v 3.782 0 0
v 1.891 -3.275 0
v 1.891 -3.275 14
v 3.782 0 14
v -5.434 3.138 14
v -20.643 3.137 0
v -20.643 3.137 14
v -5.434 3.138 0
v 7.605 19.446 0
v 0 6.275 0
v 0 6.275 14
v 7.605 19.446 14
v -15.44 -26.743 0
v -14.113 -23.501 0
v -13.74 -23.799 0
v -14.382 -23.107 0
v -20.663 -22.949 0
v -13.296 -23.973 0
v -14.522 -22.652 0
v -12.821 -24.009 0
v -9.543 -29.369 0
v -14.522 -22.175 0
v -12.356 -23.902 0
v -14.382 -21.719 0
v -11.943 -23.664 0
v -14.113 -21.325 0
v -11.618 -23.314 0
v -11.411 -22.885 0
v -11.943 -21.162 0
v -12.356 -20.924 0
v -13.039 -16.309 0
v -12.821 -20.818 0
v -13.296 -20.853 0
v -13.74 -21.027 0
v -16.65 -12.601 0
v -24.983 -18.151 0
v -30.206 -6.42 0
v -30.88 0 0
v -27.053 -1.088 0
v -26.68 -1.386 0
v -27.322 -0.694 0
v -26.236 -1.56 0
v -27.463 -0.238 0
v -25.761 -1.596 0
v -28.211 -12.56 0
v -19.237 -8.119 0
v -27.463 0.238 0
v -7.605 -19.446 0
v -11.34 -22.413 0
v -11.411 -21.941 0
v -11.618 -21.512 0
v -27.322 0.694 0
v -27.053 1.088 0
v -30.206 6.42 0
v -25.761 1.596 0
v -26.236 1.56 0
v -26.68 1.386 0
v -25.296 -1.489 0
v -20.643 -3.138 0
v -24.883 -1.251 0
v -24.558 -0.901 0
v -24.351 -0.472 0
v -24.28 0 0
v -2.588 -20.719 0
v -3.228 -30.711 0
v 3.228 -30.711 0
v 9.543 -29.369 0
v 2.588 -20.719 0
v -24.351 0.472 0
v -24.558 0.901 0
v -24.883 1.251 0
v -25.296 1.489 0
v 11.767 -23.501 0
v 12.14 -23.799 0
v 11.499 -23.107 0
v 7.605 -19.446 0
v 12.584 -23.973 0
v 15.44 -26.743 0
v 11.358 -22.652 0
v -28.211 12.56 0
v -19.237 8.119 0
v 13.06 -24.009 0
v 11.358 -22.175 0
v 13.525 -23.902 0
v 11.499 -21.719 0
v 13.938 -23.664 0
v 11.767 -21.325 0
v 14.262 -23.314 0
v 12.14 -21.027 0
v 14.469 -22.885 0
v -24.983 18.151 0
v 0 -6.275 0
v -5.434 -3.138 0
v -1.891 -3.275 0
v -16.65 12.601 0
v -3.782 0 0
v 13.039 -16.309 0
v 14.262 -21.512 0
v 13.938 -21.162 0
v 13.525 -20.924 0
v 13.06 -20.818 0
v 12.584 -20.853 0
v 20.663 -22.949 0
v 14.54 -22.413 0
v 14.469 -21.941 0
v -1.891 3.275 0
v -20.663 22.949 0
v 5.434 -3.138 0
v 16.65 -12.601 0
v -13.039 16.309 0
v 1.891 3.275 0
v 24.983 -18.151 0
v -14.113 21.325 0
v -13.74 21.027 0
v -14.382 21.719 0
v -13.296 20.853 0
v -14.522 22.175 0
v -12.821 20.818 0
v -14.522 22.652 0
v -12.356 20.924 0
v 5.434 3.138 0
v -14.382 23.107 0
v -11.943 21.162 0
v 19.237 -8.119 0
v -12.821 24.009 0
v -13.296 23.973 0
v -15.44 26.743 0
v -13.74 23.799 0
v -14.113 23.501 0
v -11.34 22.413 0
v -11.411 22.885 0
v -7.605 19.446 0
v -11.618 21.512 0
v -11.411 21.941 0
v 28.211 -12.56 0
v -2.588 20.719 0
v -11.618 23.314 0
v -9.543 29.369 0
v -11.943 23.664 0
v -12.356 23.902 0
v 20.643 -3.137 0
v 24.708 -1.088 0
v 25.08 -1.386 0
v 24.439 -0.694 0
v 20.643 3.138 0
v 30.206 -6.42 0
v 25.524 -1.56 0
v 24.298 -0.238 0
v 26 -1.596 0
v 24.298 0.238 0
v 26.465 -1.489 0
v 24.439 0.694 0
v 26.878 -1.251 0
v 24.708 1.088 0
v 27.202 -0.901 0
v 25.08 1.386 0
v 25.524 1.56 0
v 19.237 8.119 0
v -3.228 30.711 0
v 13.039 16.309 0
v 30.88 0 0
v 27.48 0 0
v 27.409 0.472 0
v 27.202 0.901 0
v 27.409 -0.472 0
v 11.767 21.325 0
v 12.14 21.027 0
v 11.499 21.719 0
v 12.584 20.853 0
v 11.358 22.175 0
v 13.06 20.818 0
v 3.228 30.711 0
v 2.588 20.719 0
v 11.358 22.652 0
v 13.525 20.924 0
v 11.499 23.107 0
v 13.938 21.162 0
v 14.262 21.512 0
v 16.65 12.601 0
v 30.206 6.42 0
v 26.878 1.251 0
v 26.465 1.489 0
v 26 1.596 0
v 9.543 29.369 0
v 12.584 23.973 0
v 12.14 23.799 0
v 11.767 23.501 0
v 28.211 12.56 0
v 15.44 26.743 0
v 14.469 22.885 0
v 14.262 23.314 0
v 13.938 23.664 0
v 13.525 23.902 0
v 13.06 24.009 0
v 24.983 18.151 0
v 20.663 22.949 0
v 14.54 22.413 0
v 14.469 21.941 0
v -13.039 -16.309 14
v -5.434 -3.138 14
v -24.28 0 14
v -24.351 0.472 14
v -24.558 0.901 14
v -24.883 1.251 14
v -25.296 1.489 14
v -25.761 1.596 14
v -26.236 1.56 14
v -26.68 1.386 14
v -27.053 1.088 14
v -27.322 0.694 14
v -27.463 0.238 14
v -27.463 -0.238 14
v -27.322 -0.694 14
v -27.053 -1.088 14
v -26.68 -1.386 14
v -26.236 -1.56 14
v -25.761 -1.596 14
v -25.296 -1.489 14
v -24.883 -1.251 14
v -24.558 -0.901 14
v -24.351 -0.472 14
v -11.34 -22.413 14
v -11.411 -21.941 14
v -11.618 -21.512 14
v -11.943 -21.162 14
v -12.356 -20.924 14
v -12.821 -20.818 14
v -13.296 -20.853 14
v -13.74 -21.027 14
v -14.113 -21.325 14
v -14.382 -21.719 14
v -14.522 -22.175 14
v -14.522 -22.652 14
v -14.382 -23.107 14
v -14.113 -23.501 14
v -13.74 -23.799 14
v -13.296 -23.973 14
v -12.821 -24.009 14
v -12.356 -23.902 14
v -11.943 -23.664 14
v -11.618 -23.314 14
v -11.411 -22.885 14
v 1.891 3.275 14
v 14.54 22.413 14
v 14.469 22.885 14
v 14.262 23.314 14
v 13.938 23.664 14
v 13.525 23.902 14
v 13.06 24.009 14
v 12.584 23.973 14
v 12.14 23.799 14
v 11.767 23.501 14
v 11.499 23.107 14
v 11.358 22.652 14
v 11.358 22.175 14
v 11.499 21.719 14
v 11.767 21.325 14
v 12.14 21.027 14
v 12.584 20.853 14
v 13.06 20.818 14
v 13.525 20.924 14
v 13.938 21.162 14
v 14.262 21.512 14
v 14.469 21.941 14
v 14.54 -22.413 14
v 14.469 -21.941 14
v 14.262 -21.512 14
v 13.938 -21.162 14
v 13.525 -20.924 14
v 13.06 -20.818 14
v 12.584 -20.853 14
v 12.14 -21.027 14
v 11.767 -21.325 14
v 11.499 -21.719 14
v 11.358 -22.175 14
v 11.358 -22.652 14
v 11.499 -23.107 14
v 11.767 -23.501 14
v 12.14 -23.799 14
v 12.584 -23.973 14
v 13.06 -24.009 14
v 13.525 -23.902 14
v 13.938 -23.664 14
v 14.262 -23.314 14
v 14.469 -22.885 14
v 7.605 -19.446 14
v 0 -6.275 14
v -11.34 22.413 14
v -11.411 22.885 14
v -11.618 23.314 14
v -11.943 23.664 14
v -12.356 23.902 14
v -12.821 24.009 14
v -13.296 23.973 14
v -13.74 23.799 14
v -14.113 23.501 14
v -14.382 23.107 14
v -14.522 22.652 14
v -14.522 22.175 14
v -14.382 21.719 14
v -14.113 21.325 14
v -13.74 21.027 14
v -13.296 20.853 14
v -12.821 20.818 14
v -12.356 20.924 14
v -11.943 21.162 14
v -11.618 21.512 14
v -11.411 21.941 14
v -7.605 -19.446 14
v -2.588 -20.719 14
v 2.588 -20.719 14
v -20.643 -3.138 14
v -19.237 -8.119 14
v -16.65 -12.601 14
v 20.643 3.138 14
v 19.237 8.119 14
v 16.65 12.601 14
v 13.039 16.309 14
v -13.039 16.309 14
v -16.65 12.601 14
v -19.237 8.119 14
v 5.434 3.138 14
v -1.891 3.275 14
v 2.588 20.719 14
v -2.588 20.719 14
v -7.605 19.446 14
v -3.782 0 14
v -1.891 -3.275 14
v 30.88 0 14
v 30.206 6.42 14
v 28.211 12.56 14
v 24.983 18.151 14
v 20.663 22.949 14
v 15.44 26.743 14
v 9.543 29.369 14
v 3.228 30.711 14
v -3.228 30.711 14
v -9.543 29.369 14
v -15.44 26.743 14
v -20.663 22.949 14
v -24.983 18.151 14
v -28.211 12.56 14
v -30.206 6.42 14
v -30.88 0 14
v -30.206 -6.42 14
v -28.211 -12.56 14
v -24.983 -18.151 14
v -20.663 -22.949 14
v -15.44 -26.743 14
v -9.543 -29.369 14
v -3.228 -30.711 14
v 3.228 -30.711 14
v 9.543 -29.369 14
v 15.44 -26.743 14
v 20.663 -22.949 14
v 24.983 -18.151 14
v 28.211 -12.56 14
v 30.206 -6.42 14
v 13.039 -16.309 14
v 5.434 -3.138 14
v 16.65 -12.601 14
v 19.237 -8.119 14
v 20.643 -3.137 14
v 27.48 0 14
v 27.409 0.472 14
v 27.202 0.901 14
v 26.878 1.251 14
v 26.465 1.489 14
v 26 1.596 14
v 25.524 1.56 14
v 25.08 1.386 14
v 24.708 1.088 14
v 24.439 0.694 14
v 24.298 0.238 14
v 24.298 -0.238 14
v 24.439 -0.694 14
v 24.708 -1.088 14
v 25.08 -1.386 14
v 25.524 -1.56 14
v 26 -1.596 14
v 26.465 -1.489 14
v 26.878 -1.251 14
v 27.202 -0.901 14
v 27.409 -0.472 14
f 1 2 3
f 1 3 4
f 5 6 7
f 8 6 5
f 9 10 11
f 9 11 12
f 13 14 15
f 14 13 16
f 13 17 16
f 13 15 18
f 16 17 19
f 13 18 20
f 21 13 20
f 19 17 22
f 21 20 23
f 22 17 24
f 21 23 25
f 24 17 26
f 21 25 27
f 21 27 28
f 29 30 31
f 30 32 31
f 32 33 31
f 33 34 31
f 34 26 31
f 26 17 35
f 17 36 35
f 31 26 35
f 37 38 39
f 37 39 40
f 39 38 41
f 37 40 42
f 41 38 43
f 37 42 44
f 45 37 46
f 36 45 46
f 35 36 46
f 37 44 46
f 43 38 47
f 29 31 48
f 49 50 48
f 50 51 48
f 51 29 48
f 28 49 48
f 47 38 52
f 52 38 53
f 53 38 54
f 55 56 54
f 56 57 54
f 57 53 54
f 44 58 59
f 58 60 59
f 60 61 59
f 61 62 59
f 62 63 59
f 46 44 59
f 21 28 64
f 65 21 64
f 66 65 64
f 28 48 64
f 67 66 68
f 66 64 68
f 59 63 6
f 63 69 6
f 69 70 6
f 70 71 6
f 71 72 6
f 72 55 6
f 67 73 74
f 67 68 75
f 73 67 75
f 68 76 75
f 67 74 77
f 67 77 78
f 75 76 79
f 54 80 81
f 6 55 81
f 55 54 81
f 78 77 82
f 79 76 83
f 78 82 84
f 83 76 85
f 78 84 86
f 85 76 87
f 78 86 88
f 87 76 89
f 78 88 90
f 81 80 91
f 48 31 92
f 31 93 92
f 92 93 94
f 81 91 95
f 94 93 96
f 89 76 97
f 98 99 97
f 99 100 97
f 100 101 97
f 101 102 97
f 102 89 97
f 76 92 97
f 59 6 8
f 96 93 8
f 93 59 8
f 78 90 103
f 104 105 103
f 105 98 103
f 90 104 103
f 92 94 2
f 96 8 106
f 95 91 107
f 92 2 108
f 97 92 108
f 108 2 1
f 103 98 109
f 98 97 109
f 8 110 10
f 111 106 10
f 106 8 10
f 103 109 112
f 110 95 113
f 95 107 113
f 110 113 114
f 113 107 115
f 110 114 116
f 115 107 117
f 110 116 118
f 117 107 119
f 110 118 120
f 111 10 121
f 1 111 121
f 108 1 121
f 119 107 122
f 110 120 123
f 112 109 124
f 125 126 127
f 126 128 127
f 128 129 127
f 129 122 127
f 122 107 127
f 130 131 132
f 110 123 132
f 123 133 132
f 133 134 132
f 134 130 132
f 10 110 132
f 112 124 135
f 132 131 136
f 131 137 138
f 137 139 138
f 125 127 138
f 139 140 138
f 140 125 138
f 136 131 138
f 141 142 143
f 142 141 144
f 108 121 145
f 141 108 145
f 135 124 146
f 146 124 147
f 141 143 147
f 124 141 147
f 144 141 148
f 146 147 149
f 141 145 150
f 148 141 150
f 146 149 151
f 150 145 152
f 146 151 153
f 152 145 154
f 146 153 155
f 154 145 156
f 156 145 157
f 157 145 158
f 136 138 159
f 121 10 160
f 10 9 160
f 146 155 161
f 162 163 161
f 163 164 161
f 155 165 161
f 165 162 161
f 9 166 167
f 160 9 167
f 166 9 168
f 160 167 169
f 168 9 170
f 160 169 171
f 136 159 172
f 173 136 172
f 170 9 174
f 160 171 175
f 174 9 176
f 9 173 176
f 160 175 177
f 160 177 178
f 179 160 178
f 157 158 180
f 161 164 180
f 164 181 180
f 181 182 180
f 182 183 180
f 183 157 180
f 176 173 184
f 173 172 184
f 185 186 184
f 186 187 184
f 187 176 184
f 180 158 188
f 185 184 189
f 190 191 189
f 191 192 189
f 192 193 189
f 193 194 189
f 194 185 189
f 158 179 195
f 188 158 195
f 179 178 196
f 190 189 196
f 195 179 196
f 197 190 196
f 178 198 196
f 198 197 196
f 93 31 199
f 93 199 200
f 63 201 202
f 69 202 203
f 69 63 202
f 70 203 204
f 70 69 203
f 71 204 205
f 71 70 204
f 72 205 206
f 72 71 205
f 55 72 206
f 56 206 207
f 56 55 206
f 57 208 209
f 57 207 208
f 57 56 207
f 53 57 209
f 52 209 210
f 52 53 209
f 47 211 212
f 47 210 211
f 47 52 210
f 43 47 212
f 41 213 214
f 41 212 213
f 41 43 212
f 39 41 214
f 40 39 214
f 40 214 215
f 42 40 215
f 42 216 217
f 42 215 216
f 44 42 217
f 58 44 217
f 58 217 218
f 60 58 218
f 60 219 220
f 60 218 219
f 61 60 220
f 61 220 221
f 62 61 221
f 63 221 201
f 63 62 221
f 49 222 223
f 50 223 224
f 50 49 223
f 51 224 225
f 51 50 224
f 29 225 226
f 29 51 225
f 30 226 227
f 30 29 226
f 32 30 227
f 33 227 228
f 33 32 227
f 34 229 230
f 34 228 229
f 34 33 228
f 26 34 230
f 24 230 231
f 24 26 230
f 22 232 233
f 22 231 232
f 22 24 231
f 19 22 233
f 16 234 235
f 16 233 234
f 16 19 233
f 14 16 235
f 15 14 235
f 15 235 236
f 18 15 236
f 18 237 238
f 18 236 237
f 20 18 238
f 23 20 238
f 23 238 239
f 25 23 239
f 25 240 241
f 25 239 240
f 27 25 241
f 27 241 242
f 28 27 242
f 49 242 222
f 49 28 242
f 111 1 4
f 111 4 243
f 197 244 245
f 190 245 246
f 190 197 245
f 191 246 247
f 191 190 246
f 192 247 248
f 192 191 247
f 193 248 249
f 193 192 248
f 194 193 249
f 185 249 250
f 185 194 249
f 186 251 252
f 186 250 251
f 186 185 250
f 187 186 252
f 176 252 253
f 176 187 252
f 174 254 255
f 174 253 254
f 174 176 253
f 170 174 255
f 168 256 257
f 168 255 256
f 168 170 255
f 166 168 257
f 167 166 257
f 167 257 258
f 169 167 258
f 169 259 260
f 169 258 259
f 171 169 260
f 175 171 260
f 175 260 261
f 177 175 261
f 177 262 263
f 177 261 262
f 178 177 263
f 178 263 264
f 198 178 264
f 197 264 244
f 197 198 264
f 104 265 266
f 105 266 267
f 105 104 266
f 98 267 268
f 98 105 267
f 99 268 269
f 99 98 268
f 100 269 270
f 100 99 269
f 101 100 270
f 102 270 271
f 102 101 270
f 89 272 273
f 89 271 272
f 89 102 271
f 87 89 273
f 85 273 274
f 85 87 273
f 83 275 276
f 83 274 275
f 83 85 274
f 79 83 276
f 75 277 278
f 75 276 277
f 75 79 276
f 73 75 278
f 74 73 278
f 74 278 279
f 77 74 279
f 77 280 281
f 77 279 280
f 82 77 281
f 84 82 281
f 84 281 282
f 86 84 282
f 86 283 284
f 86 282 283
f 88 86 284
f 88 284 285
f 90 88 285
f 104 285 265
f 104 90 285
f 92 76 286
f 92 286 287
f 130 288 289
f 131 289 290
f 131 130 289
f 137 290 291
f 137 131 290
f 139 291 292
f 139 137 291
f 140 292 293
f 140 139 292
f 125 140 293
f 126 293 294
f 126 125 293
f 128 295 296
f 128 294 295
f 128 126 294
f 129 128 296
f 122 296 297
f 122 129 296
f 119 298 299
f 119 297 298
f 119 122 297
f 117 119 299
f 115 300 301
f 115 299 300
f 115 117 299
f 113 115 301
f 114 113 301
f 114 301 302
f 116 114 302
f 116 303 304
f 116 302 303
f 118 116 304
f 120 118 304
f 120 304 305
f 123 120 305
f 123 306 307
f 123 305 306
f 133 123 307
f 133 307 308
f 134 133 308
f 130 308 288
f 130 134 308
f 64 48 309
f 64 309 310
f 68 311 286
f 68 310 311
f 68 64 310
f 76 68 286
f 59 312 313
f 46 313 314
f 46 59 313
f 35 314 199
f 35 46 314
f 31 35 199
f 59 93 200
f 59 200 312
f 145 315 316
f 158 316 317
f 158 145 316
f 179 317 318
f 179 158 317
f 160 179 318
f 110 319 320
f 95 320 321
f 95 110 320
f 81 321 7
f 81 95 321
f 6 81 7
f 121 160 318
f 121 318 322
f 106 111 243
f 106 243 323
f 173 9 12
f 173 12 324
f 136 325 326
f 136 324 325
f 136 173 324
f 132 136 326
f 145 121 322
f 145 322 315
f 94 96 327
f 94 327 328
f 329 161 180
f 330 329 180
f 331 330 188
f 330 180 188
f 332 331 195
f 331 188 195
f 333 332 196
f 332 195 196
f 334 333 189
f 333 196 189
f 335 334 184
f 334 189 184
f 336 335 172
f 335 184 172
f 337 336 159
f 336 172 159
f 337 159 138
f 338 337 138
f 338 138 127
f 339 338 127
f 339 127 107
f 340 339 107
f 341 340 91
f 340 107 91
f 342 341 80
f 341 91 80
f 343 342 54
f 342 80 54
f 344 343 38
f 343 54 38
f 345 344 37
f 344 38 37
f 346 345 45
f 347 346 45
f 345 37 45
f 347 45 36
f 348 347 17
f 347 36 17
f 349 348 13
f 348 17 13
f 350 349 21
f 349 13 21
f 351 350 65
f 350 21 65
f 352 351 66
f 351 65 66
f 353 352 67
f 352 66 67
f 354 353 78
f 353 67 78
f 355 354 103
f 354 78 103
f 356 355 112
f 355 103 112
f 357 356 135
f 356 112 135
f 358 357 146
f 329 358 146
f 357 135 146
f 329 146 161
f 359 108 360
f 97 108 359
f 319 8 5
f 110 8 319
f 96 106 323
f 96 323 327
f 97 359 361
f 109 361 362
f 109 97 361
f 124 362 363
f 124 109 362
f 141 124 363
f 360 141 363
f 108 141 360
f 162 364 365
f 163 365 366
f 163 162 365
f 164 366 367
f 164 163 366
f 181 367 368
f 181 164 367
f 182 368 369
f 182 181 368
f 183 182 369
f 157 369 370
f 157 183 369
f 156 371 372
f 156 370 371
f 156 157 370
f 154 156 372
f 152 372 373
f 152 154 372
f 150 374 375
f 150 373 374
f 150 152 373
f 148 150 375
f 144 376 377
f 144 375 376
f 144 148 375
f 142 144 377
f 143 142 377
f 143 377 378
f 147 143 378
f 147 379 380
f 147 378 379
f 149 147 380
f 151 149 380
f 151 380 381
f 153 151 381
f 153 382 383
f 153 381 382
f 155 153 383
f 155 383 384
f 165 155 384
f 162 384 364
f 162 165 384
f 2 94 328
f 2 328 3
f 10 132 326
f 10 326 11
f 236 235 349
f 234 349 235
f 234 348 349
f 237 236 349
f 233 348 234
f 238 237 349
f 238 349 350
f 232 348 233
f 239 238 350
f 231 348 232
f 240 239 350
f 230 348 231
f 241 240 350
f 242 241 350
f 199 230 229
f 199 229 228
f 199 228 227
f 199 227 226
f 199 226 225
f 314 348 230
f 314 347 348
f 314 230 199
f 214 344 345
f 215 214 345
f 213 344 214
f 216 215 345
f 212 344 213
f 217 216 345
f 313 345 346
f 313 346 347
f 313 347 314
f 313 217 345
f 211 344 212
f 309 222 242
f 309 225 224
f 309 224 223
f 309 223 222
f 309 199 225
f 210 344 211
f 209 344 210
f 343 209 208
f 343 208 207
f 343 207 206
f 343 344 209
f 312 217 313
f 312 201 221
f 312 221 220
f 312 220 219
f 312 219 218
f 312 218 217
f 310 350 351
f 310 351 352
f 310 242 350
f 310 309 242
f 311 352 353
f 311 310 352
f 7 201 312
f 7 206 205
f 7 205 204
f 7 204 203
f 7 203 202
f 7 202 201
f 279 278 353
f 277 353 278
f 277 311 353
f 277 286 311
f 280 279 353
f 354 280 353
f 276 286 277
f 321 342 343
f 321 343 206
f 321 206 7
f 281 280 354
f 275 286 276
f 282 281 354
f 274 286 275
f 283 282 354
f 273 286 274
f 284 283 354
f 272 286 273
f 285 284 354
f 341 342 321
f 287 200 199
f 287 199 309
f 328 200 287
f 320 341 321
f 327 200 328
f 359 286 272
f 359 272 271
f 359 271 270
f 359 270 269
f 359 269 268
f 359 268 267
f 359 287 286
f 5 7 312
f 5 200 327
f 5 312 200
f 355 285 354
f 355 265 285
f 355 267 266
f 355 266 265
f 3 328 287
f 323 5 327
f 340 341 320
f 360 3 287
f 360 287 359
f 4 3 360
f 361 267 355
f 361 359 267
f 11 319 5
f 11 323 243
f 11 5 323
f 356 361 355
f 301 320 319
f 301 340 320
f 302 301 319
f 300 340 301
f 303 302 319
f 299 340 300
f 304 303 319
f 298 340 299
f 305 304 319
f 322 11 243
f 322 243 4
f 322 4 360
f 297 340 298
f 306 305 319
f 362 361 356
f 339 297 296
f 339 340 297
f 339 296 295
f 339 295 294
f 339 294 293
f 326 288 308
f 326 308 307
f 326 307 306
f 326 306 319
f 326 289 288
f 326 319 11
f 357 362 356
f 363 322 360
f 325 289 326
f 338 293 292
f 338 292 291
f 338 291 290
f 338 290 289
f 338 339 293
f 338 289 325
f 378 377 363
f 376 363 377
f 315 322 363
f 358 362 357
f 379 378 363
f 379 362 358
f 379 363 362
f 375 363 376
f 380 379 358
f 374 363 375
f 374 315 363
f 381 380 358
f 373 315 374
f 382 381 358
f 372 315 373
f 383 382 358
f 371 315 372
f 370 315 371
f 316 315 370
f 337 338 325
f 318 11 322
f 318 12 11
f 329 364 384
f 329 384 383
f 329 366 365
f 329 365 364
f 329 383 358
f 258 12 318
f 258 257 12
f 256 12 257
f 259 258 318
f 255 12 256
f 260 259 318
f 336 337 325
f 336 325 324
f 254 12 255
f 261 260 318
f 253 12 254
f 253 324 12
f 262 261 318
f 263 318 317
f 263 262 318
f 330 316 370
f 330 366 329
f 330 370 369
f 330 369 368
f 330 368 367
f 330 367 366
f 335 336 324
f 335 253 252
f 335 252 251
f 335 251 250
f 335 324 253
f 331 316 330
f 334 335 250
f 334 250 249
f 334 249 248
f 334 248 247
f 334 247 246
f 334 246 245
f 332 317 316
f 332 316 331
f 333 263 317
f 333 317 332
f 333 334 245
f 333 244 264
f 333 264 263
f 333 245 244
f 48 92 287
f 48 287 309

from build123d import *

# Parameters (mm, degrees)
SKETCH2_R             = 30.880396168
HUB_DEPTH             = 14
SKETCH4_R             = 1.6
AXLE_AND_SCREWS_DEPTH = 46.860633827
RIBS_REACH            = 47.861


with BuildPart() as part:
    # Sketch2 → Hub (new body)
    with BuildSketch(Plane.XY):
        Circle(SKETCH2_R)
    extrude(amount=HUB_DEPTH)

    # Sketch4 → Axle and screws (cut, through all)
    with BuildSketch(Plane.XY):
        with Locations((12.940198084, -22.413080541)):
            Circle(SKETCH4_R)
        with Locations((-12.940198084, -22.413080541)):
            Circle(SKETCH4_R)
        with Locations((-25.880396168, 0)):
            Circle(SKETCH4_R)
        with Locations((-12.940198084, 22.413080541)):
            Circle(SKETCH4_R)
        with Locations((12.940198084, 22.413080541)):
            Circle(SKETCH4_R)
        with Locations((25.880396168, 0)):
            Circle(SKETCH4_R)
        Polygon((-1.890822132, -3.275), (1.890822132, -3.275), (3.781644263, 0), (1.890822132, 3.275), (-1.890822132, 3.275), (-3.781644263, 0), align=None)
    extrude(amount=AXLE_AND_SCREWS_DEPTH, mode=Mode.SUBTRACT)

    # Sketch5 → Ribs (cut, up to next)
    with BuildSketch(Plane.XY, mode=Mode.PRIVATE) as ribs_sk1:
        with BuildLine():
            Line((-5.434309409, -3.1375), (-20.643329137, -3.1375))
            ThreePointArc((-20.643329137, -3.1375), (-18.082953522, -10.440198084), (-13.038819273, -16.308897452))
            Line((-13.038819273, -16.308897452), (-5.434309409, -3.1375))
        make_face()
    ribs_tool1 = extrude(ribs_sk1.sketch, amount=RIBS_REACH, mode=Mode.PRIVATE) & part.part
    # Sketch5 → Ribs (cut, up to next)
    with BuildSketch(Plane.XY, mode=Mode.PRIVATE) as ribs_sk2:
        with BuildLine():
            Line((0, -6.275), (-7.604509864, -19.446397452))
            ThreePointArc((-7.604509864, -19.446397452), (0, -20.880396168), (7.604509864, -19.446397452))
            Line((7.604509864, -19.446397452), (0, -6.275))
        make_face()
    ribs_tool2 = extrude(ribs_sk2.sketch, amount=RIBS_REACH, mode=Mode.PRIVATE) & part.part
    # Sketch5 → Ribs (cut, up to next)
    with BuildSketch(Plane.XY, mode=Mode.PRIVATE) as ribs_sk3:
        with BuildLine():
            Line((5.434309409, -3.1375), (13.038819273, -16.308897452))
            ThreePointArc((13.038819273, -16.308897452), (18.082953522, -10.440198084), (20.643329137, -3.1375))
            Line((20.643329137, -3.1375), (5.434309409, -3.1375))
        make_face()
    ribs_tool3 = extrude(ribs_sk3.sketch, amount=RIBS_REACH, mode=Mode.PRIVATE) & part.part
    # Sketch5 → Ribs (cut, up to next)
    with BuildSketch(Plane.XY, mode=Mode.PRIVATE) as ribs_sk4:
        with BuildLine():
            Line((5.434309409, 3.1375), (20.643329137, 3.1375))
            ThreePointArc((20.643329137, 3.1375), (18.082953522, 10.440198084), (13.038819273, 16.308897452))
            Line((13.038819273, 16.308897452), (5.434309409, 3.1375))
        make_face()
    ribs_tool4 = extrude(ribs_sk4.sketch, amount=RIBS_REACH, mode=Mode.PRIVATE) & part.part
    # Sketch5 → Ribs (cut, up to next)
    with BuildSketch(Plane.XY, mode=Mode.PRIVATE) as ribs_sk5:
        with BuildLine():
            Line((-20.643329137, 3.1375), (-5.434309409, 3.1375))
            Line((-5.434309409, 3.1375), (-13.038819273, 16.308897452))
            ThreePointArc((-13.038819273, 16.308897452), (-18.082953522, 10.440198084), (-20.643329137, 3.1375))
        make_face()
    ribs_tool5 = extrude(ribs_sk5.sketch, amount=RIBS_REACH, mode=Mode.PRIVATE) & part.part
    # Sketch5 → Ribs (cut, up to next)
    with BuildSketch(Plane.XY, mode=Mode.PRIVATE) as ribs_sk6:
        with BuildLine():
            Line((0, 6.275), (7.604509864, 19.446397452))
            ThreePointArc((7.604509864, 19.446397452), (0, 20.880396168), (-7.604509864, 19.446397452))
            Line((-7.604509864, 19.446397452), (0, 6.275))
        make_face()
    ribs_tool6 = extrude(ribs_sk6.sketch, amount=RIBS_REACH, mode=Mode.PRIVATE) & part.part
    add(ribs_tool1.solids().sort_by_distance((-13.587324, -7.844645, 0))[0], mode=Mode.SUBTRACT)
    add(ribs_tool2.solids().sort_by_distance((0, -15.68929, 0))[0], mode=Mode.SUBTRACT)
    add(ribs_tool3.solids().sort_by_distance((13.587324, -7.844645, 0))[0], mode=Mode.SUBTRACT)
    add(ribs_tool4.solids().sort_by_distance((13.587324, 7.844645, 0))[0], mode=Mode.SUBTRACT)
    add(ribs_tool5.solids().sort_by_distance((-13.587324, 7.844645, 0))[0], mode=Mode.SUBTRACT)
    add(ribs_tool6.solids().sort_by_distance((0, 15.68929, 0))[0], mode=Mode.SUBTRACT)


solid = part.part
